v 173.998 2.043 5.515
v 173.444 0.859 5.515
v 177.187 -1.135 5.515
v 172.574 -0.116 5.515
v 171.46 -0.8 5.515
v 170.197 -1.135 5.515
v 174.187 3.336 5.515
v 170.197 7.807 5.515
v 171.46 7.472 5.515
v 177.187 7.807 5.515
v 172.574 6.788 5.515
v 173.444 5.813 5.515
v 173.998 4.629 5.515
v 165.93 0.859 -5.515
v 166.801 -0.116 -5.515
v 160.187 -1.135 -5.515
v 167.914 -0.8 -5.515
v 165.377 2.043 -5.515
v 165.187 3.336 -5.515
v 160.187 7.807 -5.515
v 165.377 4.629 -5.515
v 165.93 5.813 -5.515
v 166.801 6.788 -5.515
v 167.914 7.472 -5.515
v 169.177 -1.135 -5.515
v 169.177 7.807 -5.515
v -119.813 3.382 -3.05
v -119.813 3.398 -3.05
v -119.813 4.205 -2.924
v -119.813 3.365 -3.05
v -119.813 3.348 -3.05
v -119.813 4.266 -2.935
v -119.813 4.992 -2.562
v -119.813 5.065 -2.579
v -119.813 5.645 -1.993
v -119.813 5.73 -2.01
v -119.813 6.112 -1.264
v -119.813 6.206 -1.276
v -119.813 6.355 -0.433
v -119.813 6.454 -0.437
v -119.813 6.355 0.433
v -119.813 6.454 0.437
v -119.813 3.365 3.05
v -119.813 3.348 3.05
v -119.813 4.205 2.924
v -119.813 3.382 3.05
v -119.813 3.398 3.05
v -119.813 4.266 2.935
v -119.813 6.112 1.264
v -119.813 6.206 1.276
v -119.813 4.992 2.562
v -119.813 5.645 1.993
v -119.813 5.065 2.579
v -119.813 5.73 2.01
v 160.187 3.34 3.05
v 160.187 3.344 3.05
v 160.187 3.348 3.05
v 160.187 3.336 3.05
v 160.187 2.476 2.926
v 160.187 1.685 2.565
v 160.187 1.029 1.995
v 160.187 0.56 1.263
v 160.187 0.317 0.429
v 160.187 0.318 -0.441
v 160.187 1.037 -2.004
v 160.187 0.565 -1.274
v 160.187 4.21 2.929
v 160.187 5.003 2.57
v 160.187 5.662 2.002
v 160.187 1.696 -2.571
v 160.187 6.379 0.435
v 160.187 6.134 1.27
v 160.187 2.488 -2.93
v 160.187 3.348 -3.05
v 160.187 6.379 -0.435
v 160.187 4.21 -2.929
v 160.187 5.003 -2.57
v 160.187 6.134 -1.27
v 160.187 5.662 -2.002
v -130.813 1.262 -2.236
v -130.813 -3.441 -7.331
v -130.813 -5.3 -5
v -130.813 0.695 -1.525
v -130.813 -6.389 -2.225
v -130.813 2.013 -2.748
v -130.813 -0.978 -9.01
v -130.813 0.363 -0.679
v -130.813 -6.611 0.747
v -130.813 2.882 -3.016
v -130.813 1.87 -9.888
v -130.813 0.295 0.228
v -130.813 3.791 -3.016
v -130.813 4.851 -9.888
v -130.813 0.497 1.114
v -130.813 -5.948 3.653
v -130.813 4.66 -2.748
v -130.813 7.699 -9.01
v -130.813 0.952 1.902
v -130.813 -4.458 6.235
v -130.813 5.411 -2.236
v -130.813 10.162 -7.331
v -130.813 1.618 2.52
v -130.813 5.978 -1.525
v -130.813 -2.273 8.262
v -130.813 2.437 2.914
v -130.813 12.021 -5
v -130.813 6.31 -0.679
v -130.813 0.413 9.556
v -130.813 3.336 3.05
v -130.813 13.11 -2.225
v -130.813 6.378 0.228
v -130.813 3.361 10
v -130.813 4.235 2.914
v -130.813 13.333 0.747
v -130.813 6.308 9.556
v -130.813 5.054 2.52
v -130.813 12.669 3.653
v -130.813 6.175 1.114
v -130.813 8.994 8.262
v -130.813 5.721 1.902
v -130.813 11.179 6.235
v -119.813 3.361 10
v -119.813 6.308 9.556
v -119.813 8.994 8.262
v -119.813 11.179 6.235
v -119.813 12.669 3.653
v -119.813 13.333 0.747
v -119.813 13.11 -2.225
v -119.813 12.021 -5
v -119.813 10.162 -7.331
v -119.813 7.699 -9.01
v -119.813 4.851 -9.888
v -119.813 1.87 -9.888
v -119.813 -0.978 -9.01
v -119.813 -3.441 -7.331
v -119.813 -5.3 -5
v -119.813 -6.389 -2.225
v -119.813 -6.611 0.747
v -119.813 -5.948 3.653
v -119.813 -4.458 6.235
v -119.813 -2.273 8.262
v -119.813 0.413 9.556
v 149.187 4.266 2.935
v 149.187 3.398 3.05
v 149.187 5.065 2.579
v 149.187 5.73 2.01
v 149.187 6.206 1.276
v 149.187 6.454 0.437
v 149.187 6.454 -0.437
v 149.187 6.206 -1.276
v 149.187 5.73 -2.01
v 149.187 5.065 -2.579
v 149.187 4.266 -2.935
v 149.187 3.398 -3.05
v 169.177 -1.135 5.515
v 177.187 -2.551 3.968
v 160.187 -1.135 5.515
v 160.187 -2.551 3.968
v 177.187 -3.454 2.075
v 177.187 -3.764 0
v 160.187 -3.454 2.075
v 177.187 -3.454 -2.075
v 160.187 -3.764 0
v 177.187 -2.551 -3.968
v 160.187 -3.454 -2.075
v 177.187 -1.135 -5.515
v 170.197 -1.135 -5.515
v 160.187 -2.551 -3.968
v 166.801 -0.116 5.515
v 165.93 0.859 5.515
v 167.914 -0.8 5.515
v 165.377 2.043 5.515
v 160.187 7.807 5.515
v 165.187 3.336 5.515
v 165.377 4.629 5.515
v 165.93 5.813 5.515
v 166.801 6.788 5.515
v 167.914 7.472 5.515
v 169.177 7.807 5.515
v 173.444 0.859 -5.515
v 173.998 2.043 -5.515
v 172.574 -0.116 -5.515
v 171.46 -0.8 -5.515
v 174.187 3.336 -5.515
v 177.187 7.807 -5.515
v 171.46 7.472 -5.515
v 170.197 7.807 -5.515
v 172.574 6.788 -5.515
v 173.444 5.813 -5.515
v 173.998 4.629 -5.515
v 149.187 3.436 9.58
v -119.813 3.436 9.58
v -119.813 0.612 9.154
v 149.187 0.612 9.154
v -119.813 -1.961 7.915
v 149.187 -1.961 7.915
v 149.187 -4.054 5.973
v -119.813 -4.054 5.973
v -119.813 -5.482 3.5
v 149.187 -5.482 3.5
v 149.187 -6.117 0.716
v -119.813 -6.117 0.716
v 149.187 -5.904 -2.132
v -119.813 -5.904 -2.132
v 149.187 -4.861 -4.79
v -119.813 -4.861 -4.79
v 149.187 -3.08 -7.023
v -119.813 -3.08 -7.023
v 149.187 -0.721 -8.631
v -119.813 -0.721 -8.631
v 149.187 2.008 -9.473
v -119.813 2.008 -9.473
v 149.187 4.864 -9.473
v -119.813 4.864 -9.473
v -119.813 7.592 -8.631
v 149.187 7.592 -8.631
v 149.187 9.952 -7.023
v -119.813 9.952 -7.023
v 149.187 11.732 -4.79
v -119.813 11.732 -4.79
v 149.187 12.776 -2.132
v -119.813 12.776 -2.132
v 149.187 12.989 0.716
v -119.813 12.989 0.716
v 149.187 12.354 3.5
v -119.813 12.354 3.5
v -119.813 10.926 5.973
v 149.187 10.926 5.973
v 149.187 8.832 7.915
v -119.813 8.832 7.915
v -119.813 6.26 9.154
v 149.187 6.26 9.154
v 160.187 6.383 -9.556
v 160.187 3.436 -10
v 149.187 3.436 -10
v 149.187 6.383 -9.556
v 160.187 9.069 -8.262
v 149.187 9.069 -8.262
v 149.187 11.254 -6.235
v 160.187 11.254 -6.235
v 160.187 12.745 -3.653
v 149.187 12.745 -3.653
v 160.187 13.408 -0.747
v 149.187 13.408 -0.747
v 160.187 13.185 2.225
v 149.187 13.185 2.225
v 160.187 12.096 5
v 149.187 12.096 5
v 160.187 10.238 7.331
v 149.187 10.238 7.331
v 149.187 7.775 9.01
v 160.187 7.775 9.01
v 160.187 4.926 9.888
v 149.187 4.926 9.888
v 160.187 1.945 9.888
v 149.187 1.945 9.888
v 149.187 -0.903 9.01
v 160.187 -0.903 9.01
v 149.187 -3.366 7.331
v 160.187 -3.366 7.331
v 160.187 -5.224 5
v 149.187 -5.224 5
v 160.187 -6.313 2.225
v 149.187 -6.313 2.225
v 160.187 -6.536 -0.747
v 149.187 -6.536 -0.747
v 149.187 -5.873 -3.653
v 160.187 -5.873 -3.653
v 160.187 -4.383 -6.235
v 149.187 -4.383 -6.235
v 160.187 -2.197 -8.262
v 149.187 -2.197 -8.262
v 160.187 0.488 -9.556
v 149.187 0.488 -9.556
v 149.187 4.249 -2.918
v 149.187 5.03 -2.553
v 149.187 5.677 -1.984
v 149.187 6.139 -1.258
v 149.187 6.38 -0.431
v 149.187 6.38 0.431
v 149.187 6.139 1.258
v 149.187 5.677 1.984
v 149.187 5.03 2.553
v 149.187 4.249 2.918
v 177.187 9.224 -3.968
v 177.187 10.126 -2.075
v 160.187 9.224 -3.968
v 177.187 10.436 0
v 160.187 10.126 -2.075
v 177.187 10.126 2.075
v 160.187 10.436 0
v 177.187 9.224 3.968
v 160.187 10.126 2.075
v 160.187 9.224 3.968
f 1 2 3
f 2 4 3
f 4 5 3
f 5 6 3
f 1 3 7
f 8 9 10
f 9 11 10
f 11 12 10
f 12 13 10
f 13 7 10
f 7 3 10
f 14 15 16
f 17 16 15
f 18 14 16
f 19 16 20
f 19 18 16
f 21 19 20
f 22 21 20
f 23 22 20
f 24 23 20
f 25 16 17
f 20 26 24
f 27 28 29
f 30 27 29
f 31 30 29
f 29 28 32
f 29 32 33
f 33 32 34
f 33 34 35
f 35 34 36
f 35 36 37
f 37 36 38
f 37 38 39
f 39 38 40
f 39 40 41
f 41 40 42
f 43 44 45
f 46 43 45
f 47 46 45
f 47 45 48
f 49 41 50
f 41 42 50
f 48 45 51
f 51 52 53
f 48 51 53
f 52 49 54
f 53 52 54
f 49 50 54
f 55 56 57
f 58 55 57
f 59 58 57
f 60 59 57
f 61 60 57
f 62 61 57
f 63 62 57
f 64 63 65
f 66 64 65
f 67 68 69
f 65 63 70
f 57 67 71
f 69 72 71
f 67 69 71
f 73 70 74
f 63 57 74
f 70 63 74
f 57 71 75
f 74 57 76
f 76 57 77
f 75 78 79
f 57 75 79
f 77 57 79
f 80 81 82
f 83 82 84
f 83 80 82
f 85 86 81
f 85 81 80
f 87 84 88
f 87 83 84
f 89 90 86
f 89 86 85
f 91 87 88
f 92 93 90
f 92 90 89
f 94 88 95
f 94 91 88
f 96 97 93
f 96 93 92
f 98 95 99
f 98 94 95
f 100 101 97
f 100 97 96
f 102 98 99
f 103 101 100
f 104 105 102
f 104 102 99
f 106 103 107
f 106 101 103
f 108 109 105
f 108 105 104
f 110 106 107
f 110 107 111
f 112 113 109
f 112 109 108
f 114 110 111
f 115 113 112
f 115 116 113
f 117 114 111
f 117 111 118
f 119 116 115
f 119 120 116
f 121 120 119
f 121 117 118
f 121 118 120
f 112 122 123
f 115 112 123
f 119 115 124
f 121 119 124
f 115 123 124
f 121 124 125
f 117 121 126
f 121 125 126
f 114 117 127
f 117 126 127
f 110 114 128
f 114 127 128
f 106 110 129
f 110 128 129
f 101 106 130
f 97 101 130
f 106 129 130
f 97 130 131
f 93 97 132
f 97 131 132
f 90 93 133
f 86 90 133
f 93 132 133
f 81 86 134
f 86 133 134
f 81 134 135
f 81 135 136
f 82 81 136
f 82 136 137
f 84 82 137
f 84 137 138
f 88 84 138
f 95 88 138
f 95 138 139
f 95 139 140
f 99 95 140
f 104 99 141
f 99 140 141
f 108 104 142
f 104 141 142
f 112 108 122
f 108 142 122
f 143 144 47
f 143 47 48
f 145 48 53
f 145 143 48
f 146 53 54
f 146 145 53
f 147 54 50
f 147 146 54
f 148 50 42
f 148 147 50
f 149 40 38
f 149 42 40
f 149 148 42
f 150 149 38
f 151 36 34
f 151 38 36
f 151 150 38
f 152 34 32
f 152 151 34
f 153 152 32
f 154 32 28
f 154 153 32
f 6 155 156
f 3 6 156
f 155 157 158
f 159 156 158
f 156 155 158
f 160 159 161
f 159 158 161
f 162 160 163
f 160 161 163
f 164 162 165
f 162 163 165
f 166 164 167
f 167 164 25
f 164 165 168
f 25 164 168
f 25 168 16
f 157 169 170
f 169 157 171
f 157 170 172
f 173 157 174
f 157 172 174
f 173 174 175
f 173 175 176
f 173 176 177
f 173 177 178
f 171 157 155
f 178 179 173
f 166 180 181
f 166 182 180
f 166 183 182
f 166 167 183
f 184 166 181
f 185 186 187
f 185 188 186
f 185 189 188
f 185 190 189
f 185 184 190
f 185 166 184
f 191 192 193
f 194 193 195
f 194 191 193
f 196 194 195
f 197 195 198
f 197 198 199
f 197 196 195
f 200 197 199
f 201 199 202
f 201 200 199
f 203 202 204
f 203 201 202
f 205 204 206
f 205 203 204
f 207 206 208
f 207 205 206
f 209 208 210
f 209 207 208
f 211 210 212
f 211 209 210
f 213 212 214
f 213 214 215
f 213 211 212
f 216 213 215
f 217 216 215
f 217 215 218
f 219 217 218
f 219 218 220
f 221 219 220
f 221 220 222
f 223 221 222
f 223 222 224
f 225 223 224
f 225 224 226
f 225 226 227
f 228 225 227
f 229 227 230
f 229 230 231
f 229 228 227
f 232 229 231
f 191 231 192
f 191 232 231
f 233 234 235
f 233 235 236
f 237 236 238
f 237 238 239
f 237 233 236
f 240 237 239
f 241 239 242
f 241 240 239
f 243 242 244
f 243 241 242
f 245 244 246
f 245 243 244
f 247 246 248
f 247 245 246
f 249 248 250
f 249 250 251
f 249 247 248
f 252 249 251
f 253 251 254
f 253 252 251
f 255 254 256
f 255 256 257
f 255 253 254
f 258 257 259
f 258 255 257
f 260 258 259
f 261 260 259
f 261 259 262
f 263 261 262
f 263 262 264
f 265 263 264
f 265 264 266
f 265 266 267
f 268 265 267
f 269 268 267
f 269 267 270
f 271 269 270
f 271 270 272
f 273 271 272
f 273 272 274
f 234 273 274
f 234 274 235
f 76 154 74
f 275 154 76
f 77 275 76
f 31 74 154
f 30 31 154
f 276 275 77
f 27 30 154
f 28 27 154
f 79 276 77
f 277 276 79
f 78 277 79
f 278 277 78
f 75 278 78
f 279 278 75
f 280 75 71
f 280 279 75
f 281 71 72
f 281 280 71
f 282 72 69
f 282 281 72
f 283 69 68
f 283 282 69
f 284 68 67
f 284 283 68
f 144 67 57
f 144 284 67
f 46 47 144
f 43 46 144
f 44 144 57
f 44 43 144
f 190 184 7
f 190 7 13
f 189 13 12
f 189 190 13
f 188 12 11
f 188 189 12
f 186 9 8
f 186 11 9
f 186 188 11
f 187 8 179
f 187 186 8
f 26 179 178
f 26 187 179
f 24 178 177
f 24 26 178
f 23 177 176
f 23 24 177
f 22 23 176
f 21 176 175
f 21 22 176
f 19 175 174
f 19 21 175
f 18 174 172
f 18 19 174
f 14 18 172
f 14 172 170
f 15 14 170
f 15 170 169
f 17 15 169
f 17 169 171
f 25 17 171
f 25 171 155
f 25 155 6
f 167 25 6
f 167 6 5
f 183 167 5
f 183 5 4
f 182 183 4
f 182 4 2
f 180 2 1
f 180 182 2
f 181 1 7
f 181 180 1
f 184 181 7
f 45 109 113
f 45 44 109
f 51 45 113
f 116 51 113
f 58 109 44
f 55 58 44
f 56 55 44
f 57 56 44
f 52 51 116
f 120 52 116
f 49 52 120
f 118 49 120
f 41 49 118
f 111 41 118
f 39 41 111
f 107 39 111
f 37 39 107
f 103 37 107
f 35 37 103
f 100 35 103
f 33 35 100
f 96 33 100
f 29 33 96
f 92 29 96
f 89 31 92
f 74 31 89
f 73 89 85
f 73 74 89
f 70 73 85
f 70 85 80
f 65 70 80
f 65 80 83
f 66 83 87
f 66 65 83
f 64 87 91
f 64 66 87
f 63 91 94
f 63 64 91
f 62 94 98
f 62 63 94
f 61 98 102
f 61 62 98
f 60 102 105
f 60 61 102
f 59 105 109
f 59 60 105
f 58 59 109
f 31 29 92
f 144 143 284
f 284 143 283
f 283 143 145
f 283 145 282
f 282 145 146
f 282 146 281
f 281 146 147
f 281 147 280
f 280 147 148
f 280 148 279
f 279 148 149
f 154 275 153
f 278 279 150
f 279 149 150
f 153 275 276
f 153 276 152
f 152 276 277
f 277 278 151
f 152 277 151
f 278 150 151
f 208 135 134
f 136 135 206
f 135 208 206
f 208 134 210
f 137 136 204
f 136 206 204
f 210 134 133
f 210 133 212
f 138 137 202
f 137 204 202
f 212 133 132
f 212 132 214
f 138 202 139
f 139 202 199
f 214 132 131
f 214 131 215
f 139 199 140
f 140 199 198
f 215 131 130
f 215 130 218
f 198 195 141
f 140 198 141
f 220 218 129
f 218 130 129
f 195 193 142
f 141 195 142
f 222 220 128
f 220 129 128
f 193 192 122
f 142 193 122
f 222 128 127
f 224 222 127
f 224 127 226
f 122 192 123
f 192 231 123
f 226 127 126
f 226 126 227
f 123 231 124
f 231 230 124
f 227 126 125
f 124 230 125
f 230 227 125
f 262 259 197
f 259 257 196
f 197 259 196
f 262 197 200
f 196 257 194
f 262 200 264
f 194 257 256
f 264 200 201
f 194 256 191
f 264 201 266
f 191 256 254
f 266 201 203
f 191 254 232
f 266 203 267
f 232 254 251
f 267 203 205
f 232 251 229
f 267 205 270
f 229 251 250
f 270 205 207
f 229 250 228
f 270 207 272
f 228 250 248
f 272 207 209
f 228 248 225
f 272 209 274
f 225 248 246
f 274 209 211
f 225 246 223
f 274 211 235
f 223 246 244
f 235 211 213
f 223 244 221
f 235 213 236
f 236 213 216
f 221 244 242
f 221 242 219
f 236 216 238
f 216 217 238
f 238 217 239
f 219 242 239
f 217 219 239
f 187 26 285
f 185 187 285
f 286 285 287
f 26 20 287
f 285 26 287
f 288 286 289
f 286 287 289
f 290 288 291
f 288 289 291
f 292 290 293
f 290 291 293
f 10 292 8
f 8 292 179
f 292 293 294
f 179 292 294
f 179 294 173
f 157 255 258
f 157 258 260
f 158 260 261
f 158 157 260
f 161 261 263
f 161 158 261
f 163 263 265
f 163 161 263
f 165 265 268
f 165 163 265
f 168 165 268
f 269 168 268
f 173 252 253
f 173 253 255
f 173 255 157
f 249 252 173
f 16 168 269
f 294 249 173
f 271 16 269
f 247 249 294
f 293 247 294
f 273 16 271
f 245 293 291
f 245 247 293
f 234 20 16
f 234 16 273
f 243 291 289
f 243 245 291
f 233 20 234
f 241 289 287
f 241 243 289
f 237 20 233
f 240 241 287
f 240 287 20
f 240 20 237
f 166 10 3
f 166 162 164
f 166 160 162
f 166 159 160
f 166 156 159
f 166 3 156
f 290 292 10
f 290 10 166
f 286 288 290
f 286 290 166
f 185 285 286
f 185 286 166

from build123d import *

# Parameters (mm, degrees)
SKETCH1_W               = 280
SKETCH1_H               = 9.58
CUT_EXTRUDE1_DEPTH      = 281.466018322
CUT_EXTRUDE1_DEPTH_BACK = 281.466018322
SKETCH2_R               = 3.05
SKETCH4_R               = 10
BOSS_EXTRUDE1_DEPTH     = 11
CUT_EXTRUDE2_DEPTH      = 281.500482539
CUT_EXTRUDE2_DEPTH_BACK = 281.500482539
SKETCH7_R               = 3.05
SKETCH11_R              = 10
BOSS_EXTRUDE2_DEPTH     = 11
CUT_EXTRUDE4_DEPTH      = 292.481595825
CUT_EXTRUDE4_DEPTH_BACK = 292.481595825
SKETCH12_R              = 3.05
SKETCH13_R              = 7.1
BOSS_EXTRUDE3_DEPTH     = 17
CUT_EXTRUDE5_DEPTH      = 178.977152858
CUT_EXTRUDE5_DEPTH_BACK = 178.977152858
SKETCH14_R              = 4.5
CUT_EXTRUDE6_REACH      = 310.455
SKETCH16_W              = 5.118750851
SKETCH16_H              = 10.923653892
SKETCH16_W_2            = 7.412502438


with BuildPart() as part:
    # Sketch1 → Revolve2 (revolve)
    with BuildSketch(Plane.XY, mode=Mode.PRIVATE) as revolve2_sk:
        with Locations((20.187319621, -1.354200627)):
            Rectangle(SKETCH1_W, SKETCH1_H)
    revolve(revolve2_sk.sketch.rotate(Axis((-119.812680379, 3.435799373, 0), (1, 0, 0)), 270), axis=Axis((-119.812680379, 3.435799373, 0), (1, 0, 0)))

    # Sketch2 → Cut-Extrude1 (cut, two sides: drawn at the far end of the back side and taken through both)
    with BuildSketch(Plane.ZY.offset(119.812680379).offset(-CUT_EXTRUDE1_DEPTH_BACK)):
        with Locations((0, 3.435799373)):
            Circle(SKETCH2_R)
    extrude(amount=CUT_EXTRUDE1_DEPTH + CUT_EXTRUDE1_DEPTH_BACK, mode=Mode.SUBTRACT)

    # Sketch4 → Boss-Extrude1 (add)
    with BuildSketch(Plane(origin=(160.187319621, 0, 0), x_dir=(0, 0, -1), z_dir=(1, 0, 0))):
        with Locations((0, 3.435799373)):
            Circle(SKETCH4_R)
    extrude(amount=-BOSS_EXTRUDE1_DEPTH)

    # Sketch7 → Cut-Extrude2 (cut, two sides: drawn at the far end of the back side and taken through both)
    with BuildSketch(Plane(origin=(160.187319621, 0, 0), x_dir=(0, 0, -1), z_dir=(1, 0, 0)).offset(-CUT_EXTRUDE2_DEPTH_BACK)):
        with Locations((0, 3.360575041)):
            Circle(SKETCH7_R)
    extrude(amount=CUT_EXTRUDE2_DEPTH + CUT_EXTRUDE2_DEPTH_BACK, mode=Mode.SUBTRACT)

    # Sketch11 → Boss-Extrude2 (add)
    with BuildSketch(Plane.ZY.offset(119.812680379)):
        with Locations((0, 3.360575041)):
            Circle(SKETCH11_R)
    extrude(amount=BOSS_EXTRUDE2_DEPTH)

    # Sketch12 → Cut-Extrude4 (cut, two sides: drawn at the far end of the back side and taken through both)
    with BuildSketch(Plane.ZY.offset(130.812680379).offset(-CUT_EXTRUDE4_DEPTH_BACK)):
        with Locations((0, 3.33623901)):
            Circle(SKETCH12_R)
    extrude(amount=CUT_EXTRUDE4_DEPTH + CUT_EXTRUDE4_DEPTH_BACK, mode=Mode.SUBTRACT)

    # Sketch13 → Boss-Extrude3 (add)
    with BuildSketch(Plane(origin=(160.187319621, 0, 0), x_dir=(0, 0, -1), z_dir=(1, 0, 0))):
        with Locations((0, 3.33623901)):
            Circle(SKETCH13_R)
    extrude(amount=BOSS_EXTRUDE3_DEPTH)

    # Sketch14 → Cut-Extrude5 (cut, two sides: drawn at the far end of the back side and taken through both)
    with BuildSketch(Plane.XY.offset(-CUT_EXTRUDE5_DEPTH_BACK)):
        with Locations((169.687319621, 3.33623901)):
            Circle(SKETCH14_R)
    extrude(amount=CUT_EXTRUDE5_DEPTH + CUT_EXTRUDE5_DEPTH_BACK, mode=Mode.SUBTRACT)

    # Cut-Extrude6: up to this face of the body (flat: up to its plane)
    cut_extrude6_end = Plane(part.part.faces().sort_by_distance((160.187319621, 3.435799373, 9.717157288))[0])
    # Sketch16 → Cut-Extrude6 (cut, up to the picked face)
    with BuildSketch(Plane(origin=(177.187319621, 0, 0), x_dir=(0, 0, -1), z_dir=(1, 0, 0)), mode=Mode.PRIVATE) as cut_extrude6_sk1:
        with Locations((-8.074815219, 2.345421333)):
            Rectangle(SKETCH16_W, SKETCH16_H)
    cut_extrude6_tool1 = split(extrude(cut_extrude6_sk1.sketch, amount=-CUT_EXTRUDE6_REACH, mode=Mode.PRIVATE), bisect_by=cut_extrude6_end, keep=Keep.BOTH, mode=Mode.PRIVATE)
    # Sketch16 → Cut-Extrude6 (cut, up to the picked face)
    with BuildSketch(Plane(origin=(177.187319621, 0, 0), x_dir=(0, 0, -1), z_dir=(1, 0, 0)), mode=Mode.PRIVATE) as cut_extrude6_sk2:
        with Locations((9.221691013, 2.345421333)):
            Rectangle(SKETCH16_W_2, SKETCH16_H)
    cut_extrude6_tool2 = split(extrude(cut_extrude6_sk2.sketch, amount=-CUT_EXTRUDE6_REACH, mode=Mode.PRIVATE), bisect_by=cut_extrude6_end, keep=Keep.BOTH, mode=Mode.PRIVATE)
    add(cut_extrude6_tool1.solids().sort_by(Axis((177.18732, 2.345421, 8.074815), (-1, 0, 0)))[0], mode=Mode.SUBTRACT)
    add(cut_extrude6_tool2.solids().sort_by(Axis((177.18732, 2.345421, -9.221691), (-1, 0, 0)))[0], mode=Mode.SUBTRACT)


solid = part.part
